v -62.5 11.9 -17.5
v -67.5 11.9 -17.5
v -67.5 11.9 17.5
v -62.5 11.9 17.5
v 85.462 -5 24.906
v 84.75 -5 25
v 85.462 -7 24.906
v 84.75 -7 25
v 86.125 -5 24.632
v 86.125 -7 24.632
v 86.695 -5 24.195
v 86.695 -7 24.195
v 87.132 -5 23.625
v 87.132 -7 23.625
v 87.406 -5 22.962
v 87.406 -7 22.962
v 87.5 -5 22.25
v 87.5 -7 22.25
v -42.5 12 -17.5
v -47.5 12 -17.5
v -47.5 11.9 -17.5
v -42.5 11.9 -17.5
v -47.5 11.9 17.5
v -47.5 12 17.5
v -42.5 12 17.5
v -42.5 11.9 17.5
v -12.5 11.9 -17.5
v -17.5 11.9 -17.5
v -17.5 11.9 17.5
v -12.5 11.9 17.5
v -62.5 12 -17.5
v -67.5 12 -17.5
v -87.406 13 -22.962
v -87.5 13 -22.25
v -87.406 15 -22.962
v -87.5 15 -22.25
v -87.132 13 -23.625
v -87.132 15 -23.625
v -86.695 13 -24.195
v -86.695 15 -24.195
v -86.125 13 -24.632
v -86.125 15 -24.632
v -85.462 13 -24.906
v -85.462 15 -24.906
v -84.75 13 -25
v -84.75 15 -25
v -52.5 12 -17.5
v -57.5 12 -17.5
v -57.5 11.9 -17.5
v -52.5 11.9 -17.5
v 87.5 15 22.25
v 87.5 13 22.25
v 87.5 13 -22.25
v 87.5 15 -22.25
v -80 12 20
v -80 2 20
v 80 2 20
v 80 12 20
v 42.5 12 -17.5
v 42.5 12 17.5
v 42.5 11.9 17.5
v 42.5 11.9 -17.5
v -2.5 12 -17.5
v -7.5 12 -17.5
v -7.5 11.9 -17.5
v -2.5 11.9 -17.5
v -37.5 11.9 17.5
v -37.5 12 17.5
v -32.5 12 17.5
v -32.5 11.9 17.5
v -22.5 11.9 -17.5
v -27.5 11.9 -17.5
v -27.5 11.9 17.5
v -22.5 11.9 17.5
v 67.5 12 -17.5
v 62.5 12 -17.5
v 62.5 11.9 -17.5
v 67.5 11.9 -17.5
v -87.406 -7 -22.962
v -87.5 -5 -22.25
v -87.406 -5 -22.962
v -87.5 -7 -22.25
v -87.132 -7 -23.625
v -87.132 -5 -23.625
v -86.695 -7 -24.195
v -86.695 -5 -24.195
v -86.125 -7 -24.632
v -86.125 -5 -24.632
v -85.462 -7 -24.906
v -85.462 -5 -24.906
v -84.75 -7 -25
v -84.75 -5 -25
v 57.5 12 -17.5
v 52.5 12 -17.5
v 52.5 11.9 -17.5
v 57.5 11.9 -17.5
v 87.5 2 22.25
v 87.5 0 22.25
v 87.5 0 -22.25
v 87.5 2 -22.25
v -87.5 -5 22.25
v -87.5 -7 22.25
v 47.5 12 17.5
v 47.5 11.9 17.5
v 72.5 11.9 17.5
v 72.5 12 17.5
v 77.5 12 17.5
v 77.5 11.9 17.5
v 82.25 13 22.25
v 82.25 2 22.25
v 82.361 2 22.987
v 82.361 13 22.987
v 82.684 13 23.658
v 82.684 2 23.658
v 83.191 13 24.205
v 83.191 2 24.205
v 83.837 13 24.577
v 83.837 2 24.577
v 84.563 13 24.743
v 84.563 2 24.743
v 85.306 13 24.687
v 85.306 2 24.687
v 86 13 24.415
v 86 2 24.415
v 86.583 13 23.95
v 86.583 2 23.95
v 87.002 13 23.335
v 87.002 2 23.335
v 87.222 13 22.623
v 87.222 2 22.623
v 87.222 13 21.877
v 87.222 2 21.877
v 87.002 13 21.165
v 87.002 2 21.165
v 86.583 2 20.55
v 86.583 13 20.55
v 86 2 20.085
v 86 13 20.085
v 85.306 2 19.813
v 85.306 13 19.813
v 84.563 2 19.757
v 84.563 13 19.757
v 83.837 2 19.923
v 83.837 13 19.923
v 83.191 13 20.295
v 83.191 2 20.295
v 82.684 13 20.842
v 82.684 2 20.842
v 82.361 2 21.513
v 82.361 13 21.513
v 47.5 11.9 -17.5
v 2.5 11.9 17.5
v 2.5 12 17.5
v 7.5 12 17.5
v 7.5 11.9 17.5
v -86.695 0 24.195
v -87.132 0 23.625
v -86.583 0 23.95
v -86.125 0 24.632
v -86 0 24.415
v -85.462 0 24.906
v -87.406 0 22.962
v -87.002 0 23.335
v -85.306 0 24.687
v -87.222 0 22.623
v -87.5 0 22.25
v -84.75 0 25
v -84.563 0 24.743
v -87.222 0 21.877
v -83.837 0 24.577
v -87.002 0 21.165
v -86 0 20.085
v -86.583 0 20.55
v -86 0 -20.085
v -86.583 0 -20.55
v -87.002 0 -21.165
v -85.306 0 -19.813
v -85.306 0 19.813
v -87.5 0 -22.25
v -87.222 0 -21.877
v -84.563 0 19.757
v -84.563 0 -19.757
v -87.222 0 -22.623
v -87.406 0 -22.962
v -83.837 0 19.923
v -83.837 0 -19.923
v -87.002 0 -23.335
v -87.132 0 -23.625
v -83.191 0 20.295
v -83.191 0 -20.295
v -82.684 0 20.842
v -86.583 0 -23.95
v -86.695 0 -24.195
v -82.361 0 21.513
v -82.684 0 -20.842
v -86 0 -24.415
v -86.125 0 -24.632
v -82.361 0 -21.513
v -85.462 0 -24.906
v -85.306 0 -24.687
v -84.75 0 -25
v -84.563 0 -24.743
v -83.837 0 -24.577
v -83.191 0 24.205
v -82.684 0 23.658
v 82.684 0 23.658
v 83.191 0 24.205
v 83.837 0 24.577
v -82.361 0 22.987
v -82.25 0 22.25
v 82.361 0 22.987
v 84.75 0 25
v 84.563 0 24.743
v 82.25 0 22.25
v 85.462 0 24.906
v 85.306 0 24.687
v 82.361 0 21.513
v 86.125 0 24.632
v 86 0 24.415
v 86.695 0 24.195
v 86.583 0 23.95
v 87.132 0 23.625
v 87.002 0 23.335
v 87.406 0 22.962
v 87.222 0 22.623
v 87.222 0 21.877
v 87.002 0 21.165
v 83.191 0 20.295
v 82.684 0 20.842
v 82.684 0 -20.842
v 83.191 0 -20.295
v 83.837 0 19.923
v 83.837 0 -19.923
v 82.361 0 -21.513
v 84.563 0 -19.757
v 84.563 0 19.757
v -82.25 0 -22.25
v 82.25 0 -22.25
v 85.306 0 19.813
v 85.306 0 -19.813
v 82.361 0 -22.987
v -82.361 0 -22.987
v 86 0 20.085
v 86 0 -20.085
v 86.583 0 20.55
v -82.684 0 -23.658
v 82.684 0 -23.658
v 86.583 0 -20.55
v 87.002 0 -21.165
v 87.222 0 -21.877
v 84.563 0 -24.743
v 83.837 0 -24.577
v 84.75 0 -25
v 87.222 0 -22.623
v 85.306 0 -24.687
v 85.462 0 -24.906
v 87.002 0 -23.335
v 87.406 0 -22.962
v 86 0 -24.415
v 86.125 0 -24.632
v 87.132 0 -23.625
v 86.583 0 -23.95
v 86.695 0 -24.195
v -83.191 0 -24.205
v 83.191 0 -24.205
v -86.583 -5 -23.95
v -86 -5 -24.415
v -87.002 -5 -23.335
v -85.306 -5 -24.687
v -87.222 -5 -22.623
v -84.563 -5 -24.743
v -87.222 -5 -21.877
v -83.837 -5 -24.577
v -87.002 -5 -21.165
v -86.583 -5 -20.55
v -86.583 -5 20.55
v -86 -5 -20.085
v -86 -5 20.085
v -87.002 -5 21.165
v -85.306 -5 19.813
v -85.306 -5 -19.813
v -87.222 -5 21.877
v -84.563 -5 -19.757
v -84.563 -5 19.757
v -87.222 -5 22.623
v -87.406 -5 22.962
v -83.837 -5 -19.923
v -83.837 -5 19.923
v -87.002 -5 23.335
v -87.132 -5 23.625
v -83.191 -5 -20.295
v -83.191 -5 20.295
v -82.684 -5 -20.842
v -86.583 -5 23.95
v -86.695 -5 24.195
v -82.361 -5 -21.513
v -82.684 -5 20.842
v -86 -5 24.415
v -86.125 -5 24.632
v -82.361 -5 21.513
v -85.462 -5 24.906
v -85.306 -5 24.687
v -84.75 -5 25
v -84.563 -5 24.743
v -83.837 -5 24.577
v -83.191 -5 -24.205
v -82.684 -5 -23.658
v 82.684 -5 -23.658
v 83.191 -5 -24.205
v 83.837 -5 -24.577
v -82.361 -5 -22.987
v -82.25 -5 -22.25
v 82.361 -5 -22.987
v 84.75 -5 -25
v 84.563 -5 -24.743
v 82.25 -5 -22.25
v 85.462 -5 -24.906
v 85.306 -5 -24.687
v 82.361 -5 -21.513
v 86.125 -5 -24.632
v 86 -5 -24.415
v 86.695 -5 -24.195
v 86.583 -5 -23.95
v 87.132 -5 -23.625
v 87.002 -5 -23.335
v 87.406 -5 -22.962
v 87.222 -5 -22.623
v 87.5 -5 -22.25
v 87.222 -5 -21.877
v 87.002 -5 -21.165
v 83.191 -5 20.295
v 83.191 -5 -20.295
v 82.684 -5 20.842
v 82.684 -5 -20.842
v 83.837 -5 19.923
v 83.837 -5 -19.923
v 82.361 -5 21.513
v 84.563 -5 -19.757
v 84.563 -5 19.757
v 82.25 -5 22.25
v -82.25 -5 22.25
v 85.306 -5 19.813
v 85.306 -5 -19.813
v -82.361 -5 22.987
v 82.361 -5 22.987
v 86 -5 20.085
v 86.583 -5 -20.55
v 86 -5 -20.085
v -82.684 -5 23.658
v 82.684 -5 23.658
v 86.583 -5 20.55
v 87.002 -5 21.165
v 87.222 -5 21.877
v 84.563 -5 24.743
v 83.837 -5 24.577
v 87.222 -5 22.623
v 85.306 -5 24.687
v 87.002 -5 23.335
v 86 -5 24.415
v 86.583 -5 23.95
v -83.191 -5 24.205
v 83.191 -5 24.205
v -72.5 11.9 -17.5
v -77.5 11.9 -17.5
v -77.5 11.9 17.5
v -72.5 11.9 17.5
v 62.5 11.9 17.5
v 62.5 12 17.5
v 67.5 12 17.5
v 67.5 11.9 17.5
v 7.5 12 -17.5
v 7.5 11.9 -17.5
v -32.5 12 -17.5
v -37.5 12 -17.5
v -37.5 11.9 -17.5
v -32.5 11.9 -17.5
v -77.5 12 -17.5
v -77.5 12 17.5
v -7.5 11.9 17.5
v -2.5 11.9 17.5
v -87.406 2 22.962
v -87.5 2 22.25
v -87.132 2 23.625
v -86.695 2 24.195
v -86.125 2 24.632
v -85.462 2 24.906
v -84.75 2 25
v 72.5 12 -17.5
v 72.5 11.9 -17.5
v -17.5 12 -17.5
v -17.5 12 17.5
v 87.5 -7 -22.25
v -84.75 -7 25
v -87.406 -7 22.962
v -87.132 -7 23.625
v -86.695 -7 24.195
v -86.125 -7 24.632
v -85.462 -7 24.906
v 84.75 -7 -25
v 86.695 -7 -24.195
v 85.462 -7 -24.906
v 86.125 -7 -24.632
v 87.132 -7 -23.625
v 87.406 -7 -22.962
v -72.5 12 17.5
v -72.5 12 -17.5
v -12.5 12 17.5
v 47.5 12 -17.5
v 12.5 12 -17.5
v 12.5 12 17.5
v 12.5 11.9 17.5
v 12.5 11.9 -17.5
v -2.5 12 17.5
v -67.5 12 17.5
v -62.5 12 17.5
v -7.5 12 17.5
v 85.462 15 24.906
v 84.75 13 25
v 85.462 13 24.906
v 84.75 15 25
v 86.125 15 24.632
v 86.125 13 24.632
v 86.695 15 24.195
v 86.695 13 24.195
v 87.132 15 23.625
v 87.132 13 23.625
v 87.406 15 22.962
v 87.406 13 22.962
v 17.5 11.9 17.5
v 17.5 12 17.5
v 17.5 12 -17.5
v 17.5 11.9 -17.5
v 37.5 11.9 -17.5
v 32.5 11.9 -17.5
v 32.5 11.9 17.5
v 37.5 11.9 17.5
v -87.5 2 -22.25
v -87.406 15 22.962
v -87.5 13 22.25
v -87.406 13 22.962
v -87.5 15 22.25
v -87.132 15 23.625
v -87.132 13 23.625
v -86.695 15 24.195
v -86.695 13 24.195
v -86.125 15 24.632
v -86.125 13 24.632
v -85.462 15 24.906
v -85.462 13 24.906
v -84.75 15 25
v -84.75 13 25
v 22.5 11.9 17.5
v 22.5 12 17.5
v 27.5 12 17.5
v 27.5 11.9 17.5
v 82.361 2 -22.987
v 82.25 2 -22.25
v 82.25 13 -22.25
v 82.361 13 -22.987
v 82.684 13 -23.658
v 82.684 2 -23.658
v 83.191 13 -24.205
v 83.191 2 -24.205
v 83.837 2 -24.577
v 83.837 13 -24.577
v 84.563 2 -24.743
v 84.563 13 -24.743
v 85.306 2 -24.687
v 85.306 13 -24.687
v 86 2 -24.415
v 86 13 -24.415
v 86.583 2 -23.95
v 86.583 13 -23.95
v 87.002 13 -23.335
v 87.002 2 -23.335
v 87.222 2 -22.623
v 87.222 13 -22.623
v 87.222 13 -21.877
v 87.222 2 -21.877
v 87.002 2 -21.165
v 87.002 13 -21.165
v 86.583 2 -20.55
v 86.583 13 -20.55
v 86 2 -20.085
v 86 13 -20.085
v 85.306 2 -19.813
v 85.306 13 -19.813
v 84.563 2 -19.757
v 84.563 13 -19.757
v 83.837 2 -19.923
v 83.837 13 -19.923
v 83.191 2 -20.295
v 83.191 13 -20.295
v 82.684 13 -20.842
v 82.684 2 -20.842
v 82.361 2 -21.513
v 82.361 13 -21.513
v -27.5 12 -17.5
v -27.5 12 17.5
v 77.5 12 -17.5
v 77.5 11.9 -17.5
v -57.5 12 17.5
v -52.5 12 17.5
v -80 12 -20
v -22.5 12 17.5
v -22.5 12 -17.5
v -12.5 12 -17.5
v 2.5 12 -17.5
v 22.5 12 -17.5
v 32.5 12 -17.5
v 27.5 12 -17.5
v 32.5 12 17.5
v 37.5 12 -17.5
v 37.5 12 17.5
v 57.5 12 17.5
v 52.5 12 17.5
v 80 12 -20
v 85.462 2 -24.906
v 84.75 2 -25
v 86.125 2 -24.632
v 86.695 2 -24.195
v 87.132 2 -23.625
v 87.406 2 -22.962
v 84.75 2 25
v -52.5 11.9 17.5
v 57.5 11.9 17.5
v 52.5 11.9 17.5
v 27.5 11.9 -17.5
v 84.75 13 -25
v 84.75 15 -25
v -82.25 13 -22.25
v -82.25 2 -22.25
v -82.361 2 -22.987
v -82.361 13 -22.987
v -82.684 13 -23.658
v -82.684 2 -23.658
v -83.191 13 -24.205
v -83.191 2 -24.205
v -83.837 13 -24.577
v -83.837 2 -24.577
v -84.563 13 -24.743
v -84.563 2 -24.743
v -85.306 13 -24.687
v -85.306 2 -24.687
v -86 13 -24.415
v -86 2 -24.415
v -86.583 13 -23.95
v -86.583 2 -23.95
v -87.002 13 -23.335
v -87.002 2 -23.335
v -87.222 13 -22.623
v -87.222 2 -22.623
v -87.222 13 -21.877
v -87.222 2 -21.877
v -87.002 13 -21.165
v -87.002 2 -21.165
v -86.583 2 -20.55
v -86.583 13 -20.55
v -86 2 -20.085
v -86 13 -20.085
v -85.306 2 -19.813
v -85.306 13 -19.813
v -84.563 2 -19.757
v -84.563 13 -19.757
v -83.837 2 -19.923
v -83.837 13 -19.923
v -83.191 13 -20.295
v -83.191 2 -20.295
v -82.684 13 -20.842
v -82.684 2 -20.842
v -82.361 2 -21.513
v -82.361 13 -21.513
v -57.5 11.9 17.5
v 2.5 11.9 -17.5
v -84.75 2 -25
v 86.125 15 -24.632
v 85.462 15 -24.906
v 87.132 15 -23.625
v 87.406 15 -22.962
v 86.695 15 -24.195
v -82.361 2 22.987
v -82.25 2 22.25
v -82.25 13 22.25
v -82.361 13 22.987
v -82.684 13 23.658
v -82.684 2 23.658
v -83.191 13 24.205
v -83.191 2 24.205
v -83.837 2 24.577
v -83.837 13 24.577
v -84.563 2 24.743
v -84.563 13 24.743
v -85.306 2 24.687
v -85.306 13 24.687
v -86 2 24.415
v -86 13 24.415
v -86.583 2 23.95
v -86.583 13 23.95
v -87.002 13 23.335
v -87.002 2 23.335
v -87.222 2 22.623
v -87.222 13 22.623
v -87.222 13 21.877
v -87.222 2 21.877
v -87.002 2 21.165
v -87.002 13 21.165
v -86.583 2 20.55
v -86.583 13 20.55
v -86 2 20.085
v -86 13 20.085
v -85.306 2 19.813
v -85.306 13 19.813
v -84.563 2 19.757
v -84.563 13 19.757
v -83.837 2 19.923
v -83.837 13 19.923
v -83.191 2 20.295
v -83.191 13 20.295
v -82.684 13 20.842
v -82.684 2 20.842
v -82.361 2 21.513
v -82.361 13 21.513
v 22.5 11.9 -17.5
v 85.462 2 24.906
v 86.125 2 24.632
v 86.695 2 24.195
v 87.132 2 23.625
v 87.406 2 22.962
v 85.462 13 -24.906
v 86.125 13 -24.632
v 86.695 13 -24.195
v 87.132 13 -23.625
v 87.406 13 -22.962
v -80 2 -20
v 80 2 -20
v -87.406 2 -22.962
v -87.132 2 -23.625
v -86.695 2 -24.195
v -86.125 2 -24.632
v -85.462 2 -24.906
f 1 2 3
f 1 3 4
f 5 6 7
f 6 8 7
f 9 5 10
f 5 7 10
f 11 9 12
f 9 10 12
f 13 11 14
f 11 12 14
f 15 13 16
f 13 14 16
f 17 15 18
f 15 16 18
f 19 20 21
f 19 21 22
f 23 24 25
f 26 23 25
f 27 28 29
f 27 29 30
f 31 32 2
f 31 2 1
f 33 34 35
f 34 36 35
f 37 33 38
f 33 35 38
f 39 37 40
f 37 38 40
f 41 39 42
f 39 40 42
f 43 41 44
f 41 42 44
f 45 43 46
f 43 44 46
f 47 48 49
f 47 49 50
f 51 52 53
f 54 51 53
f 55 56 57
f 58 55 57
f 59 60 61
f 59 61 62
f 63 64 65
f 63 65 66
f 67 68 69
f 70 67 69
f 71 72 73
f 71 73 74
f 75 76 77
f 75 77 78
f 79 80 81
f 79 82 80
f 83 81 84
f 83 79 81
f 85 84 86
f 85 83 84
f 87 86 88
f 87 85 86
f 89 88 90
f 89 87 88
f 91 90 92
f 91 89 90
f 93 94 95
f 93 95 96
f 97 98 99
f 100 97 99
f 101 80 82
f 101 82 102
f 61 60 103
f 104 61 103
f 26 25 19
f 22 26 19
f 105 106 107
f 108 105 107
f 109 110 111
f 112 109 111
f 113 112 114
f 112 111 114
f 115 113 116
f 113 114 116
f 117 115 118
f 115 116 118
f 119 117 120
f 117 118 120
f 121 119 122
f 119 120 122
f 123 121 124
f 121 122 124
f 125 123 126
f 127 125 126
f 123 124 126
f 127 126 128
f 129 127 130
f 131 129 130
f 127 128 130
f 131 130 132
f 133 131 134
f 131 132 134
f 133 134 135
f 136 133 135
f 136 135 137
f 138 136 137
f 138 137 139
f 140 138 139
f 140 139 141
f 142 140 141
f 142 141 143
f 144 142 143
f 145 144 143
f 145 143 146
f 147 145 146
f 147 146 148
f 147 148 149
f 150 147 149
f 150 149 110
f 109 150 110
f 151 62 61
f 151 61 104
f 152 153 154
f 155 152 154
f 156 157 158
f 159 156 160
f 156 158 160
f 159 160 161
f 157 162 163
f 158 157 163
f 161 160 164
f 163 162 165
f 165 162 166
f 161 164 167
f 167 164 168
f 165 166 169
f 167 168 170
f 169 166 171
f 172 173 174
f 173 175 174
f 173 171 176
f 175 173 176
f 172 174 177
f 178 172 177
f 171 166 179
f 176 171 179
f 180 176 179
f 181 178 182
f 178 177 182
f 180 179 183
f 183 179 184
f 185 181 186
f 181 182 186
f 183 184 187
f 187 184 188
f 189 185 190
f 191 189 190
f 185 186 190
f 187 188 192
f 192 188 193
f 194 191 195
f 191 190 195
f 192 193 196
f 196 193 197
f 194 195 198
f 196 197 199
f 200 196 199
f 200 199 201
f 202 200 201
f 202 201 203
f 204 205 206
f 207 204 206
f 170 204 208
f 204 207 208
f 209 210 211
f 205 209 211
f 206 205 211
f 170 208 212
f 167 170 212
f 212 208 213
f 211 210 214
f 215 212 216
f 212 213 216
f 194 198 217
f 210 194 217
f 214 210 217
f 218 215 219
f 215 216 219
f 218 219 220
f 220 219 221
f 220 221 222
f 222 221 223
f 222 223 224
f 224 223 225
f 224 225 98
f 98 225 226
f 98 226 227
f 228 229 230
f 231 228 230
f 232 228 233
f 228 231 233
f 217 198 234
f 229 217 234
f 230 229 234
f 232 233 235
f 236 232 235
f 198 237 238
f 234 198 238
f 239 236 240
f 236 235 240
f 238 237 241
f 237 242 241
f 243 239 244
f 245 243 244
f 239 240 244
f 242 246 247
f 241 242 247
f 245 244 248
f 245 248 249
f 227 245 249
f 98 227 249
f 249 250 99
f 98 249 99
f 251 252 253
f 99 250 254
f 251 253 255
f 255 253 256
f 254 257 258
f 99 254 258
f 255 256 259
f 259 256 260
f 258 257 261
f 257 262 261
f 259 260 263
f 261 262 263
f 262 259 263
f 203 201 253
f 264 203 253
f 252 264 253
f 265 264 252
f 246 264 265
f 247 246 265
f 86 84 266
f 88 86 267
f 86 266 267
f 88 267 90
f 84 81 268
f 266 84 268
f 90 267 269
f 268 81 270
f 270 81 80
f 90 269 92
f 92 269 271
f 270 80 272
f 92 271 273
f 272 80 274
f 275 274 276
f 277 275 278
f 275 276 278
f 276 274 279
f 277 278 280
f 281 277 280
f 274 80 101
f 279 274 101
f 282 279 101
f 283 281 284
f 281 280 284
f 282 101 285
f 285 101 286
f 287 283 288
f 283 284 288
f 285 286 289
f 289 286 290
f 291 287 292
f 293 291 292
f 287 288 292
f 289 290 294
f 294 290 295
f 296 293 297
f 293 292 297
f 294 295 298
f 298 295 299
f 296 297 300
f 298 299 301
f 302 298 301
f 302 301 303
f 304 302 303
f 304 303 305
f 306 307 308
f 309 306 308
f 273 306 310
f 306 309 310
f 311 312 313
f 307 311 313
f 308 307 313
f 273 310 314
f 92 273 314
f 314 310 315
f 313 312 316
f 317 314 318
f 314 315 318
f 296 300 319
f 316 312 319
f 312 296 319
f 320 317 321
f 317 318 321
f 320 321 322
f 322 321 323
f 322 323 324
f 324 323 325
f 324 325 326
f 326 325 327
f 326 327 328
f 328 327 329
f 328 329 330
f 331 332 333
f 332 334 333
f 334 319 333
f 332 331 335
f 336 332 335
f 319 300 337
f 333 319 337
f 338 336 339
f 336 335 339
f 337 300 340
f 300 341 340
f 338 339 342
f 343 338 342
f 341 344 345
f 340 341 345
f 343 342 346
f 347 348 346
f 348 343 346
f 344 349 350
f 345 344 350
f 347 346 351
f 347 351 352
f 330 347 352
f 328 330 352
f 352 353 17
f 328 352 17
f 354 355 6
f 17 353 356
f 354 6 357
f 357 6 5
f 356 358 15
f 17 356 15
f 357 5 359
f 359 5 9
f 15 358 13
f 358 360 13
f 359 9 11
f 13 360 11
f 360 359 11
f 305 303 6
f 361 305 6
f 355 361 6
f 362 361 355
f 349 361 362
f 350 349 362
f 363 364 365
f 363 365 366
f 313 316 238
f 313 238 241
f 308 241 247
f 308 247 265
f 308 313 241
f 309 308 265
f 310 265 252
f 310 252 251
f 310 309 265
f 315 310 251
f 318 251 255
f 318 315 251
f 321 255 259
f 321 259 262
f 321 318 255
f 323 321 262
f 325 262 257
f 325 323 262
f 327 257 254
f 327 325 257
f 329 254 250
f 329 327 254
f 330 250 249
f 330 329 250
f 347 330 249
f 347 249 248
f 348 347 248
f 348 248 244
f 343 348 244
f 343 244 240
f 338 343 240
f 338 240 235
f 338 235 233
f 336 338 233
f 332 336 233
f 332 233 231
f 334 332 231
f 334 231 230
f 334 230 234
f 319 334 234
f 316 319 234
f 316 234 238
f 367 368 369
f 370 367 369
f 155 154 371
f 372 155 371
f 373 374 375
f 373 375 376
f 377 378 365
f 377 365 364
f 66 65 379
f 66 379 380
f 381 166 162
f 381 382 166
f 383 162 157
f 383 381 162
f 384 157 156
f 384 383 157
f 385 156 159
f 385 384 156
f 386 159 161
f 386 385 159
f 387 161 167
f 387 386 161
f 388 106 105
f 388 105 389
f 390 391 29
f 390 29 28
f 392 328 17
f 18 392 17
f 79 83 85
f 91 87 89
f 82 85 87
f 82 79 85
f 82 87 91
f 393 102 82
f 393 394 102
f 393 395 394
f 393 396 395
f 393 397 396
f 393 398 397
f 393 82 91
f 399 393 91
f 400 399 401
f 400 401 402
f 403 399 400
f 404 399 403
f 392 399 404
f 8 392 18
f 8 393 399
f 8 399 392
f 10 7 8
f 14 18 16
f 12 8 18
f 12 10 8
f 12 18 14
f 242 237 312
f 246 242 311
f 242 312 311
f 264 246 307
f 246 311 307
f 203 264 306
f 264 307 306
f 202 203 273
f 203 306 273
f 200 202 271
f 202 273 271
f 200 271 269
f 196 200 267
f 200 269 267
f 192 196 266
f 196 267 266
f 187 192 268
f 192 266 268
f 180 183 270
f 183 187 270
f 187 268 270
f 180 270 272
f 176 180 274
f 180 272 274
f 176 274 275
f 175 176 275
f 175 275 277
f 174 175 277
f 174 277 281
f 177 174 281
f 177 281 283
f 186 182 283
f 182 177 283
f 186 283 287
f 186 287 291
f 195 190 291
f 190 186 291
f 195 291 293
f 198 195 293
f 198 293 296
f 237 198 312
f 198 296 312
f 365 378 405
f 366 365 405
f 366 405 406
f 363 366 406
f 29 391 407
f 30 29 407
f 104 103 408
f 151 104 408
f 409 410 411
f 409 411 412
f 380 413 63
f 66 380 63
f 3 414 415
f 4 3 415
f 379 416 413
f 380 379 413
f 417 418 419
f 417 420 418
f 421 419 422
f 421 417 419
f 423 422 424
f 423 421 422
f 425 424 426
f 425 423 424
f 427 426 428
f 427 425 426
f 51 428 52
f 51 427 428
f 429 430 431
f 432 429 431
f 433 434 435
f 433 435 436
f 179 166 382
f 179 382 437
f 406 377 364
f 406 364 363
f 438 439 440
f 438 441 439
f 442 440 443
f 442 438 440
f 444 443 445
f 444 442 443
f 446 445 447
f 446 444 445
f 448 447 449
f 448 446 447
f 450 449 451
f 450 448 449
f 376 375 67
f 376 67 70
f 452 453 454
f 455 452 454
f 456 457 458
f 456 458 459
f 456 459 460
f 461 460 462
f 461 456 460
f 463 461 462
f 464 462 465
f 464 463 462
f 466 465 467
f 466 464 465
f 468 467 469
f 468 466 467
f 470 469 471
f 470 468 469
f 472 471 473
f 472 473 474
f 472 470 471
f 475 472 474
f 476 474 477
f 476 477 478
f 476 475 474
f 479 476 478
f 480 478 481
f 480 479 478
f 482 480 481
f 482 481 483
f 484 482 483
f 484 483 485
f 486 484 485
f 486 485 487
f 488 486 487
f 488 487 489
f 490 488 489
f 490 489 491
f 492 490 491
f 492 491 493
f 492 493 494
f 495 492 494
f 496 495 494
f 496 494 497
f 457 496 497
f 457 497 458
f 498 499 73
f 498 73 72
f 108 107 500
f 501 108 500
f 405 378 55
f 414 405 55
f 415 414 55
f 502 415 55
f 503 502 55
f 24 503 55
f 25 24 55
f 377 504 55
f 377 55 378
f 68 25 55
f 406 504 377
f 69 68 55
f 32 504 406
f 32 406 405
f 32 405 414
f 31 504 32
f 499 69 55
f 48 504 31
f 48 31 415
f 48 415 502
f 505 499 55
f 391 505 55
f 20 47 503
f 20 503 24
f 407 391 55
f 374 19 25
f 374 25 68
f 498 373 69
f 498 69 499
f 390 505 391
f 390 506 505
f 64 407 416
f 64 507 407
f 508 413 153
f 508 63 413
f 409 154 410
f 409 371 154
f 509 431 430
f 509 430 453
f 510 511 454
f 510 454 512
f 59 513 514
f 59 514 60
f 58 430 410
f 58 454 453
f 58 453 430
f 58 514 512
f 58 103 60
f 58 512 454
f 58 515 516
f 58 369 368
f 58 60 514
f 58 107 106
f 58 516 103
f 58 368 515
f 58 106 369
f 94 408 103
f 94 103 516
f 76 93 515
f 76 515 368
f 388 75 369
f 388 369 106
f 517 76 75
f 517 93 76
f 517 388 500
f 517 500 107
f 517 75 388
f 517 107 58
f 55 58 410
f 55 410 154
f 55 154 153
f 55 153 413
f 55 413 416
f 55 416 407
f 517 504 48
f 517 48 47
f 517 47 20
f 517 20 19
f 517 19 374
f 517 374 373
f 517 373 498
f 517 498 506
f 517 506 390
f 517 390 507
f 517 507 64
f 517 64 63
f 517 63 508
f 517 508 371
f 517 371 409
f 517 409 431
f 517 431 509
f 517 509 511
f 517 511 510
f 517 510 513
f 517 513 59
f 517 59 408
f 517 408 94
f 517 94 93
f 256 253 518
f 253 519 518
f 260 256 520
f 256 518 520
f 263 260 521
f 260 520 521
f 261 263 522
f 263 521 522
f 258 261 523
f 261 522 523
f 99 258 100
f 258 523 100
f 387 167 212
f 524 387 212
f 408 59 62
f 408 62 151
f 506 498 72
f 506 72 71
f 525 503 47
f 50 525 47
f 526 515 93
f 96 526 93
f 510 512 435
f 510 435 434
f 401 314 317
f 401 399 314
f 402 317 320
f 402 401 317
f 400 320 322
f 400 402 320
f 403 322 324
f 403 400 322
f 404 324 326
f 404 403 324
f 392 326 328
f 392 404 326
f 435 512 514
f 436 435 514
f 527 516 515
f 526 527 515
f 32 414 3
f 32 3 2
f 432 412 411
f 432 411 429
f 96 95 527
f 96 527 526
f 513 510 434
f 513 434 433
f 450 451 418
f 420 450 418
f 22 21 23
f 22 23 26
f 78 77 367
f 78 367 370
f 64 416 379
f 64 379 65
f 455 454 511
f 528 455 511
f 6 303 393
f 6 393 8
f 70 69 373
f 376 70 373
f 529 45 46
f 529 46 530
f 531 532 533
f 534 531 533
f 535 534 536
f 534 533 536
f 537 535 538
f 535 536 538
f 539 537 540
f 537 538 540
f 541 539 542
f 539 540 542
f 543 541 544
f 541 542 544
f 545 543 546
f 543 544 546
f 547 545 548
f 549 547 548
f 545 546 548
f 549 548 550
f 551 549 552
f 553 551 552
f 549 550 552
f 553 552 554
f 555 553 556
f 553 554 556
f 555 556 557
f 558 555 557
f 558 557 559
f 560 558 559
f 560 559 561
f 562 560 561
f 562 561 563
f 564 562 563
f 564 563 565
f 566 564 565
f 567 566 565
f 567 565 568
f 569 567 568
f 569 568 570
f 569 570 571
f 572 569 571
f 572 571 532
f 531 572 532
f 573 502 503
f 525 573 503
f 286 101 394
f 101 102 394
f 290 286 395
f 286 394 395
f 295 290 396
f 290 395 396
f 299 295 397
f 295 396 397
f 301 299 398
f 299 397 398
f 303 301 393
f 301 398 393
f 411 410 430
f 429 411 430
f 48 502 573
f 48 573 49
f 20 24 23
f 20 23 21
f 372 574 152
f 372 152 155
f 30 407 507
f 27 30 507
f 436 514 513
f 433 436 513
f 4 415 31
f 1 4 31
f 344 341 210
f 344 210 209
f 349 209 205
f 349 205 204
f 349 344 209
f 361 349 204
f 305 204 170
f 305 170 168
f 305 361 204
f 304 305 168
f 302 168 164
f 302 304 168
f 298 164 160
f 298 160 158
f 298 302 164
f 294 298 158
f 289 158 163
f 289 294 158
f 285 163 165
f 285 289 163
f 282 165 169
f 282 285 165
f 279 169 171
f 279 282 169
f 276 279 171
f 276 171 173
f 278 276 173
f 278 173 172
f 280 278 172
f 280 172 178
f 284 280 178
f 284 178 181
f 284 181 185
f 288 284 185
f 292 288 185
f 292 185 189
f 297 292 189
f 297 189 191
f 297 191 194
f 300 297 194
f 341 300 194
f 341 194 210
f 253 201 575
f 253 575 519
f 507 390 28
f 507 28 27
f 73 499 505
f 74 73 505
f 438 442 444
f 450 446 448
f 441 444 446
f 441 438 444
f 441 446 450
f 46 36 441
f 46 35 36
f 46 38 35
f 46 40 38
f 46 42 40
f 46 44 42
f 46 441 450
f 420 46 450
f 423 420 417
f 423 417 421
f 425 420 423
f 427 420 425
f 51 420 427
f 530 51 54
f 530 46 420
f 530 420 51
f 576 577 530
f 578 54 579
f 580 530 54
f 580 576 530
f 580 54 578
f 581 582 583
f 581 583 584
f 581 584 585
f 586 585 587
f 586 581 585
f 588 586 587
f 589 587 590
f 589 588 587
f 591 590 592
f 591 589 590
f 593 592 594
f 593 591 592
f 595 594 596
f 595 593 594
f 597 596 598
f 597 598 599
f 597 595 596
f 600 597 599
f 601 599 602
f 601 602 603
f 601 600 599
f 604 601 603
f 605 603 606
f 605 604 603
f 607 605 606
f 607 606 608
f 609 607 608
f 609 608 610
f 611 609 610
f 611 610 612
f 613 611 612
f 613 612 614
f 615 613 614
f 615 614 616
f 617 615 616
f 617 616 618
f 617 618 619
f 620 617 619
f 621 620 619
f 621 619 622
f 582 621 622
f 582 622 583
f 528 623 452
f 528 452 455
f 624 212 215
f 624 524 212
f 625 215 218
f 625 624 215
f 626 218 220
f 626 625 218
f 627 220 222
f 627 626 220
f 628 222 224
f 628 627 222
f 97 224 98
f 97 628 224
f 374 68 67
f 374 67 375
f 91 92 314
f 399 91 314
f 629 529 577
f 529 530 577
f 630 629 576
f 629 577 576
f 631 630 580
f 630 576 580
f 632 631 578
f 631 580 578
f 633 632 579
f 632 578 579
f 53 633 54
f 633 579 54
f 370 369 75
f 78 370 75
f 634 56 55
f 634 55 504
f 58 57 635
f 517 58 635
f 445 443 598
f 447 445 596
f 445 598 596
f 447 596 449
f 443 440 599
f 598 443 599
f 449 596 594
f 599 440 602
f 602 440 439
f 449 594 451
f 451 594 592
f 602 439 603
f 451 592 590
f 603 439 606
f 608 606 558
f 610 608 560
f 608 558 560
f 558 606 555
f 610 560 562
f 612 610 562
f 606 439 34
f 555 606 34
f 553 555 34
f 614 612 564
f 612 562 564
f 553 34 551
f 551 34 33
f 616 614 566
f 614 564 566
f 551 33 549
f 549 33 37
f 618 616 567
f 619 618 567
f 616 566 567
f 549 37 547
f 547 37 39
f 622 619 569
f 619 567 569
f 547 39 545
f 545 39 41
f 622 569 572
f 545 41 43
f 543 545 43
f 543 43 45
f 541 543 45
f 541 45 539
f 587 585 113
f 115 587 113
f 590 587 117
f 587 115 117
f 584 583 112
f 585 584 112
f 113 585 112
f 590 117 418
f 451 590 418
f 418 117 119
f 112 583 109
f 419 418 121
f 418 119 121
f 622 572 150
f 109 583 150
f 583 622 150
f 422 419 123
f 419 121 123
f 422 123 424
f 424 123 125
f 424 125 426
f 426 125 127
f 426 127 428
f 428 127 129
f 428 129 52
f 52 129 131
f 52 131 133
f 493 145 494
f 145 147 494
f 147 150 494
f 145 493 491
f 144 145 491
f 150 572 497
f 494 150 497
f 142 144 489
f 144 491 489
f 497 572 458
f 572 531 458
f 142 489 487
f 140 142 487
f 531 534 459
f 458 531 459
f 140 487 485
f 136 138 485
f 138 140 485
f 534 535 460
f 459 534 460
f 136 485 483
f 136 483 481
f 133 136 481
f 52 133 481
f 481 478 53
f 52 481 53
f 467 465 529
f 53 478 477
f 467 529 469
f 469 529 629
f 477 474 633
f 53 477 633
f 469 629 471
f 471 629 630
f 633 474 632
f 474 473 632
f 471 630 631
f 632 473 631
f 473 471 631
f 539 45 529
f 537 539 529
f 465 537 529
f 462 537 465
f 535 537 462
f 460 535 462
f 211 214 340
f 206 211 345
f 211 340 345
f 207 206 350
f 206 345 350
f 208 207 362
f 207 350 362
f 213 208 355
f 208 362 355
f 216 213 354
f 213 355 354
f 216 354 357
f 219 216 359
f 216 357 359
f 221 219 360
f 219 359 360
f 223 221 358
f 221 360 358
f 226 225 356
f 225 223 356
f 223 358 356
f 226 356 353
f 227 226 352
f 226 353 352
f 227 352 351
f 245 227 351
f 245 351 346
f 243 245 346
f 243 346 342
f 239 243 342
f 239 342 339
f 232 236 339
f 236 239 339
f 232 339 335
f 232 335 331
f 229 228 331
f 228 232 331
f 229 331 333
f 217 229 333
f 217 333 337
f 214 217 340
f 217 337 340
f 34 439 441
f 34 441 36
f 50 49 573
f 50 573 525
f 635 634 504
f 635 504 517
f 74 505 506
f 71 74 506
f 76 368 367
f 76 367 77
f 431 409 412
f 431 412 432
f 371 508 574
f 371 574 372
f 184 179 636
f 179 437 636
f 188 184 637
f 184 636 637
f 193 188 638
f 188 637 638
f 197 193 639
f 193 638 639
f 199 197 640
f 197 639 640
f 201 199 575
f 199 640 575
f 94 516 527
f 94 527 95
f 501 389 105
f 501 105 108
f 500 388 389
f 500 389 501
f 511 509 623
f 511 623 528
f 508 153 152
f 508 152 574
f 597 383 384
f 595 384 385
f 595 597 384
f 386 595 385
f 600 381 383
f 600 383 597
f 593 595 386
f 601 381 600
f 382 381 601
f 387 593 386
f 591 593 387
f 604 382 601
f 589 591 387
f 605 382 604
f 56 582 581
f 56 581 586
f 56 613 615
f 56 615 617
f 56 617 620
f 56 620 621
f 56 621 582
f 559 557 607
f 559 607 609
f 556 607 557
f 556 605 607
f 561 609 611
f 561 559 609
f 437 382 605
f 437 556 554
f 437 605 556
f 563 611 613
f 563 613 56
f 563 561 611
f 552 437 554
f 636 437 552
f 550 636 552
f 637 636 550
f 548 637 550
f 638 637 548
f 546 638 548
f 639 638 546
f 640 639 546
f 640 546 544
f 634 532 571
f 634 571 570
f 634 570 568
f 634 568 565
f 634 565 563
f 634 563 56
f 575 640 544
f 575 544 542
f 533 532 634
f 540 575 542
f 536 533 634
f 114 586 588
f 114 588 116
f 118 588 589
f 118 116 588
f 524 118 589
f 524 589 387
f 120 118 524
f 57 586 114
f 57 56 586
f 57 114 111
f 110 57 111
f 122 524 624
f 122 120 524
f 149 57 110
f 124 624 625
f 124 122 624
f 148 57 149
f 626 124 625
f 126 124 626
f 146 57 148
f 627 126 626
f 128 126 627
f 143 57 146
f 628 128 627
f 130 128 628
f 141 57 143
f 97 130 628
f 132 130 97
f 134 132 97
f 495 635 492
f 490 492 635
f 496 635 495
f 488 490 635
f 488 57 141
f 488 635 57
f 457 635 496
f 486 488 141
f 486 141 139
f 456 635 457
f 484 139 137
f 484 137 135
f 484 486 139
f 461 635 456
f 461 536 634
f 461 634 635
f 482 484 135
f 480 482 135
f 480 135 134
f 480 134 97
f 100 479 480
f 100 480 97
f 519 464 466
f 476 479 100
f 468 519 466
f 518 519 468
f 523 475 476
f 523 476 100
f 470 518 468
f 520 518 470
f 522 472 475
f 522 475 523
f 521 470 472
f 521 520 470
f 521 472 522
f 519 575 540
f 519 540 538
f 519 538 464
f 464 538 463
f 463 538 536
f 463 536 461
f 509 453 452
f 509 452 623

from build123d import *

# Parameters (mm, degrees)
SKETCH1_W                                  = 175
SKETCH1_H                                  = 50
BOSS_EXTRUDE1_DEPTH                        = 2
BOSS_EXTRUDE2_START                        = 11
SKETCH2_W                                  = 175
SKETCH2_H                                  = 50
BOSS_EXTRUDE2_DEPTH                        = 2
BOSS_EXTRUDE3_START                        = 5
SKETCH3_W                                  = 175
SKETCH3_H                                  = 50
BOSS_EXTRUDE3_DEPTH                        = 2
SKETCH5_W                                  = 160
SKETCH5_H                                  = 40
BOSS_EXTRUDE4_DEPTH                        = 10
SKETCH7_W                                  = 5
SKETCH7_H                                  = 35
CUT_EXTRUDE1_DEPTH                         = 0.1
LPATTERN1_COUNT                            = 16
LPATTERN1_PITCH                            = 10
SKETCH8_R                                  = 2.5
BOSS_EXTRUDE5_DEPTH                        = 18
MIRROR1_AT_THE_SECOND_PLANE_COPY_1_SKETC_R = 2.5
MIRROR1_AT_THE_SECOND_PLANE_COPY_1_DEPTH   = 18
FILLET2_R                                  = 2.75


with BuildPart() as part:
    # Sketch1 → Boss-Extrude1 (new body)
    with BuildSketch(Plane(origin=(0, 0, 0), x_dir=(1, 0, 0), z_dir=(0, 1, 0))):
        Rectangle(SKETCH1_W, SKETCH1_H)
    extrude(amount=BOSS_EXTRUDE1_DEPTH)

    # Sketch5 → Boss-Extrude4 (add)
    with BuildSketch(Plane(origin=(0, 2, 0), x_dir=(1, 0, 0), z_dir=(0, 1, 0))):
        Rectangle(SKETCH5_W, SKETCH5_H)
    extrude(amount=BOSS_EXTRUDE4_DEPTH)

    # Sketch7 → Cut-Extrude1 (cut)
    with BuildSketch(Plane(origin=(0, 12, 0), x_dir=(1, 0, 0), z_dir=(0, 1, 0))):
        with Locations((-75, 0)):
            Rectangle(SKETCH7_W, SKETCH7_H)
    cut_extrude1 = extrude(amount=-CUT_EXTRUDE1_DEPTH, mode=Mode.SUBTRACT)

    # LPattern1: Cut-Extrude1 ×16
    with Locations(*[(i * LPATTERN1_PITCH, 0, 0) for i in range(1, LPATTERN1_COUNT)]):
        add(cut_extrude1, mode=Mode.SUBTRACT)



with BuildPart() as body_2:
    # Sketch2 → Boss-Extrude2 (new body)
    with BuildSketch(Plane(origin=(0, 2, 0), x_dir=(1, 0, 0), z_dir=(0, 1, 0)).offset(BOSS_EXTRUDE2_START)):
        Rectangle(SKETCH2_W, SKETCH2_H)
    extrude(amount=BOSS_EXTRUDE2_DEPTH)


with BuildPart() as body_3:
    # Sketch3 → Boss-Extrude3 (new body)
    with BuildSketch(Plane.XZ.offset(BOSS_EXTRUDE3_START)):
        Rectangle(SKETCH3_W, SKETCH3_H)
    extrude(amount=BOSS_EXTRUDE3_DEPTH)


with BuildPart() as part_1:
    add(part.part)

    add(body_2.part)  # Boss-Extrude5 merges body 2

    add(body_3.part)  # Boss-Extrude5 merges body 3
    # Sketch8 → Boss-Extrude5 (add)
    with BuildSketch(Plane(origin=(0, -5, 0), x_dir=(1, 0, 0), z_dir=(0, 1, 0))):
        with Locations((-84.75, 22.25)):
            Circle(SKETCH8_R)
    boss_extrude5 = extrude(amount=BOSS_EXTRUDE5_DEPTH)

    # Mirror1: Boss-Extrude5 across plane
    add(boss_extrude5.mirror(Plane(origin=(0, 0, 0), x_dir=(0, 0, 1), z_dir=(1, 0, 0))))

    # Mirror1 at the second plane: Boss-Extrude5 across plane
    add(boss_extrude5.mirror(Plane.XY))

    # Mirror1 at the second plane copy 1 sketc → Mirror1 at the second plane copy 1 (add)
    with BuildSketch(Plane(origin=(0, -5, 0), x_dir=(-1, 0, 0), z_dir=(0, 1, 0))):
        with Locations((-84.75, 22.25)):
            Circle(MIRROR1_AT_THE_SECOND_PLANE_COPY_1_SKETC_R)
    extrude(amount=MIRROR1_AT_THE_SECOND_PLANE_COPY_1_DEPTH)

    # Fillet2
    fillet2_edges = [part_1.edges().sort_by_distance(p)[0] for p in [
        (87.5, -6, 25),
        (-87.5, -6, 25),
        (-87.5, -6, -25),
        (87.5, -6, -25),
        (-87.5, 1, -25),
        (-87.5, 1, 25),
        (87.5, 1, 25),
        (87.5, 1, -25),
        (87.5, 14, -25),
        (87.5, 14, 25),
        (-87.5, 14, 25),
        (-87.5, 14, -25),
    ]]
    fillet(fillet2_edges, radius=FILLET2_R)


solid = part_1.part
